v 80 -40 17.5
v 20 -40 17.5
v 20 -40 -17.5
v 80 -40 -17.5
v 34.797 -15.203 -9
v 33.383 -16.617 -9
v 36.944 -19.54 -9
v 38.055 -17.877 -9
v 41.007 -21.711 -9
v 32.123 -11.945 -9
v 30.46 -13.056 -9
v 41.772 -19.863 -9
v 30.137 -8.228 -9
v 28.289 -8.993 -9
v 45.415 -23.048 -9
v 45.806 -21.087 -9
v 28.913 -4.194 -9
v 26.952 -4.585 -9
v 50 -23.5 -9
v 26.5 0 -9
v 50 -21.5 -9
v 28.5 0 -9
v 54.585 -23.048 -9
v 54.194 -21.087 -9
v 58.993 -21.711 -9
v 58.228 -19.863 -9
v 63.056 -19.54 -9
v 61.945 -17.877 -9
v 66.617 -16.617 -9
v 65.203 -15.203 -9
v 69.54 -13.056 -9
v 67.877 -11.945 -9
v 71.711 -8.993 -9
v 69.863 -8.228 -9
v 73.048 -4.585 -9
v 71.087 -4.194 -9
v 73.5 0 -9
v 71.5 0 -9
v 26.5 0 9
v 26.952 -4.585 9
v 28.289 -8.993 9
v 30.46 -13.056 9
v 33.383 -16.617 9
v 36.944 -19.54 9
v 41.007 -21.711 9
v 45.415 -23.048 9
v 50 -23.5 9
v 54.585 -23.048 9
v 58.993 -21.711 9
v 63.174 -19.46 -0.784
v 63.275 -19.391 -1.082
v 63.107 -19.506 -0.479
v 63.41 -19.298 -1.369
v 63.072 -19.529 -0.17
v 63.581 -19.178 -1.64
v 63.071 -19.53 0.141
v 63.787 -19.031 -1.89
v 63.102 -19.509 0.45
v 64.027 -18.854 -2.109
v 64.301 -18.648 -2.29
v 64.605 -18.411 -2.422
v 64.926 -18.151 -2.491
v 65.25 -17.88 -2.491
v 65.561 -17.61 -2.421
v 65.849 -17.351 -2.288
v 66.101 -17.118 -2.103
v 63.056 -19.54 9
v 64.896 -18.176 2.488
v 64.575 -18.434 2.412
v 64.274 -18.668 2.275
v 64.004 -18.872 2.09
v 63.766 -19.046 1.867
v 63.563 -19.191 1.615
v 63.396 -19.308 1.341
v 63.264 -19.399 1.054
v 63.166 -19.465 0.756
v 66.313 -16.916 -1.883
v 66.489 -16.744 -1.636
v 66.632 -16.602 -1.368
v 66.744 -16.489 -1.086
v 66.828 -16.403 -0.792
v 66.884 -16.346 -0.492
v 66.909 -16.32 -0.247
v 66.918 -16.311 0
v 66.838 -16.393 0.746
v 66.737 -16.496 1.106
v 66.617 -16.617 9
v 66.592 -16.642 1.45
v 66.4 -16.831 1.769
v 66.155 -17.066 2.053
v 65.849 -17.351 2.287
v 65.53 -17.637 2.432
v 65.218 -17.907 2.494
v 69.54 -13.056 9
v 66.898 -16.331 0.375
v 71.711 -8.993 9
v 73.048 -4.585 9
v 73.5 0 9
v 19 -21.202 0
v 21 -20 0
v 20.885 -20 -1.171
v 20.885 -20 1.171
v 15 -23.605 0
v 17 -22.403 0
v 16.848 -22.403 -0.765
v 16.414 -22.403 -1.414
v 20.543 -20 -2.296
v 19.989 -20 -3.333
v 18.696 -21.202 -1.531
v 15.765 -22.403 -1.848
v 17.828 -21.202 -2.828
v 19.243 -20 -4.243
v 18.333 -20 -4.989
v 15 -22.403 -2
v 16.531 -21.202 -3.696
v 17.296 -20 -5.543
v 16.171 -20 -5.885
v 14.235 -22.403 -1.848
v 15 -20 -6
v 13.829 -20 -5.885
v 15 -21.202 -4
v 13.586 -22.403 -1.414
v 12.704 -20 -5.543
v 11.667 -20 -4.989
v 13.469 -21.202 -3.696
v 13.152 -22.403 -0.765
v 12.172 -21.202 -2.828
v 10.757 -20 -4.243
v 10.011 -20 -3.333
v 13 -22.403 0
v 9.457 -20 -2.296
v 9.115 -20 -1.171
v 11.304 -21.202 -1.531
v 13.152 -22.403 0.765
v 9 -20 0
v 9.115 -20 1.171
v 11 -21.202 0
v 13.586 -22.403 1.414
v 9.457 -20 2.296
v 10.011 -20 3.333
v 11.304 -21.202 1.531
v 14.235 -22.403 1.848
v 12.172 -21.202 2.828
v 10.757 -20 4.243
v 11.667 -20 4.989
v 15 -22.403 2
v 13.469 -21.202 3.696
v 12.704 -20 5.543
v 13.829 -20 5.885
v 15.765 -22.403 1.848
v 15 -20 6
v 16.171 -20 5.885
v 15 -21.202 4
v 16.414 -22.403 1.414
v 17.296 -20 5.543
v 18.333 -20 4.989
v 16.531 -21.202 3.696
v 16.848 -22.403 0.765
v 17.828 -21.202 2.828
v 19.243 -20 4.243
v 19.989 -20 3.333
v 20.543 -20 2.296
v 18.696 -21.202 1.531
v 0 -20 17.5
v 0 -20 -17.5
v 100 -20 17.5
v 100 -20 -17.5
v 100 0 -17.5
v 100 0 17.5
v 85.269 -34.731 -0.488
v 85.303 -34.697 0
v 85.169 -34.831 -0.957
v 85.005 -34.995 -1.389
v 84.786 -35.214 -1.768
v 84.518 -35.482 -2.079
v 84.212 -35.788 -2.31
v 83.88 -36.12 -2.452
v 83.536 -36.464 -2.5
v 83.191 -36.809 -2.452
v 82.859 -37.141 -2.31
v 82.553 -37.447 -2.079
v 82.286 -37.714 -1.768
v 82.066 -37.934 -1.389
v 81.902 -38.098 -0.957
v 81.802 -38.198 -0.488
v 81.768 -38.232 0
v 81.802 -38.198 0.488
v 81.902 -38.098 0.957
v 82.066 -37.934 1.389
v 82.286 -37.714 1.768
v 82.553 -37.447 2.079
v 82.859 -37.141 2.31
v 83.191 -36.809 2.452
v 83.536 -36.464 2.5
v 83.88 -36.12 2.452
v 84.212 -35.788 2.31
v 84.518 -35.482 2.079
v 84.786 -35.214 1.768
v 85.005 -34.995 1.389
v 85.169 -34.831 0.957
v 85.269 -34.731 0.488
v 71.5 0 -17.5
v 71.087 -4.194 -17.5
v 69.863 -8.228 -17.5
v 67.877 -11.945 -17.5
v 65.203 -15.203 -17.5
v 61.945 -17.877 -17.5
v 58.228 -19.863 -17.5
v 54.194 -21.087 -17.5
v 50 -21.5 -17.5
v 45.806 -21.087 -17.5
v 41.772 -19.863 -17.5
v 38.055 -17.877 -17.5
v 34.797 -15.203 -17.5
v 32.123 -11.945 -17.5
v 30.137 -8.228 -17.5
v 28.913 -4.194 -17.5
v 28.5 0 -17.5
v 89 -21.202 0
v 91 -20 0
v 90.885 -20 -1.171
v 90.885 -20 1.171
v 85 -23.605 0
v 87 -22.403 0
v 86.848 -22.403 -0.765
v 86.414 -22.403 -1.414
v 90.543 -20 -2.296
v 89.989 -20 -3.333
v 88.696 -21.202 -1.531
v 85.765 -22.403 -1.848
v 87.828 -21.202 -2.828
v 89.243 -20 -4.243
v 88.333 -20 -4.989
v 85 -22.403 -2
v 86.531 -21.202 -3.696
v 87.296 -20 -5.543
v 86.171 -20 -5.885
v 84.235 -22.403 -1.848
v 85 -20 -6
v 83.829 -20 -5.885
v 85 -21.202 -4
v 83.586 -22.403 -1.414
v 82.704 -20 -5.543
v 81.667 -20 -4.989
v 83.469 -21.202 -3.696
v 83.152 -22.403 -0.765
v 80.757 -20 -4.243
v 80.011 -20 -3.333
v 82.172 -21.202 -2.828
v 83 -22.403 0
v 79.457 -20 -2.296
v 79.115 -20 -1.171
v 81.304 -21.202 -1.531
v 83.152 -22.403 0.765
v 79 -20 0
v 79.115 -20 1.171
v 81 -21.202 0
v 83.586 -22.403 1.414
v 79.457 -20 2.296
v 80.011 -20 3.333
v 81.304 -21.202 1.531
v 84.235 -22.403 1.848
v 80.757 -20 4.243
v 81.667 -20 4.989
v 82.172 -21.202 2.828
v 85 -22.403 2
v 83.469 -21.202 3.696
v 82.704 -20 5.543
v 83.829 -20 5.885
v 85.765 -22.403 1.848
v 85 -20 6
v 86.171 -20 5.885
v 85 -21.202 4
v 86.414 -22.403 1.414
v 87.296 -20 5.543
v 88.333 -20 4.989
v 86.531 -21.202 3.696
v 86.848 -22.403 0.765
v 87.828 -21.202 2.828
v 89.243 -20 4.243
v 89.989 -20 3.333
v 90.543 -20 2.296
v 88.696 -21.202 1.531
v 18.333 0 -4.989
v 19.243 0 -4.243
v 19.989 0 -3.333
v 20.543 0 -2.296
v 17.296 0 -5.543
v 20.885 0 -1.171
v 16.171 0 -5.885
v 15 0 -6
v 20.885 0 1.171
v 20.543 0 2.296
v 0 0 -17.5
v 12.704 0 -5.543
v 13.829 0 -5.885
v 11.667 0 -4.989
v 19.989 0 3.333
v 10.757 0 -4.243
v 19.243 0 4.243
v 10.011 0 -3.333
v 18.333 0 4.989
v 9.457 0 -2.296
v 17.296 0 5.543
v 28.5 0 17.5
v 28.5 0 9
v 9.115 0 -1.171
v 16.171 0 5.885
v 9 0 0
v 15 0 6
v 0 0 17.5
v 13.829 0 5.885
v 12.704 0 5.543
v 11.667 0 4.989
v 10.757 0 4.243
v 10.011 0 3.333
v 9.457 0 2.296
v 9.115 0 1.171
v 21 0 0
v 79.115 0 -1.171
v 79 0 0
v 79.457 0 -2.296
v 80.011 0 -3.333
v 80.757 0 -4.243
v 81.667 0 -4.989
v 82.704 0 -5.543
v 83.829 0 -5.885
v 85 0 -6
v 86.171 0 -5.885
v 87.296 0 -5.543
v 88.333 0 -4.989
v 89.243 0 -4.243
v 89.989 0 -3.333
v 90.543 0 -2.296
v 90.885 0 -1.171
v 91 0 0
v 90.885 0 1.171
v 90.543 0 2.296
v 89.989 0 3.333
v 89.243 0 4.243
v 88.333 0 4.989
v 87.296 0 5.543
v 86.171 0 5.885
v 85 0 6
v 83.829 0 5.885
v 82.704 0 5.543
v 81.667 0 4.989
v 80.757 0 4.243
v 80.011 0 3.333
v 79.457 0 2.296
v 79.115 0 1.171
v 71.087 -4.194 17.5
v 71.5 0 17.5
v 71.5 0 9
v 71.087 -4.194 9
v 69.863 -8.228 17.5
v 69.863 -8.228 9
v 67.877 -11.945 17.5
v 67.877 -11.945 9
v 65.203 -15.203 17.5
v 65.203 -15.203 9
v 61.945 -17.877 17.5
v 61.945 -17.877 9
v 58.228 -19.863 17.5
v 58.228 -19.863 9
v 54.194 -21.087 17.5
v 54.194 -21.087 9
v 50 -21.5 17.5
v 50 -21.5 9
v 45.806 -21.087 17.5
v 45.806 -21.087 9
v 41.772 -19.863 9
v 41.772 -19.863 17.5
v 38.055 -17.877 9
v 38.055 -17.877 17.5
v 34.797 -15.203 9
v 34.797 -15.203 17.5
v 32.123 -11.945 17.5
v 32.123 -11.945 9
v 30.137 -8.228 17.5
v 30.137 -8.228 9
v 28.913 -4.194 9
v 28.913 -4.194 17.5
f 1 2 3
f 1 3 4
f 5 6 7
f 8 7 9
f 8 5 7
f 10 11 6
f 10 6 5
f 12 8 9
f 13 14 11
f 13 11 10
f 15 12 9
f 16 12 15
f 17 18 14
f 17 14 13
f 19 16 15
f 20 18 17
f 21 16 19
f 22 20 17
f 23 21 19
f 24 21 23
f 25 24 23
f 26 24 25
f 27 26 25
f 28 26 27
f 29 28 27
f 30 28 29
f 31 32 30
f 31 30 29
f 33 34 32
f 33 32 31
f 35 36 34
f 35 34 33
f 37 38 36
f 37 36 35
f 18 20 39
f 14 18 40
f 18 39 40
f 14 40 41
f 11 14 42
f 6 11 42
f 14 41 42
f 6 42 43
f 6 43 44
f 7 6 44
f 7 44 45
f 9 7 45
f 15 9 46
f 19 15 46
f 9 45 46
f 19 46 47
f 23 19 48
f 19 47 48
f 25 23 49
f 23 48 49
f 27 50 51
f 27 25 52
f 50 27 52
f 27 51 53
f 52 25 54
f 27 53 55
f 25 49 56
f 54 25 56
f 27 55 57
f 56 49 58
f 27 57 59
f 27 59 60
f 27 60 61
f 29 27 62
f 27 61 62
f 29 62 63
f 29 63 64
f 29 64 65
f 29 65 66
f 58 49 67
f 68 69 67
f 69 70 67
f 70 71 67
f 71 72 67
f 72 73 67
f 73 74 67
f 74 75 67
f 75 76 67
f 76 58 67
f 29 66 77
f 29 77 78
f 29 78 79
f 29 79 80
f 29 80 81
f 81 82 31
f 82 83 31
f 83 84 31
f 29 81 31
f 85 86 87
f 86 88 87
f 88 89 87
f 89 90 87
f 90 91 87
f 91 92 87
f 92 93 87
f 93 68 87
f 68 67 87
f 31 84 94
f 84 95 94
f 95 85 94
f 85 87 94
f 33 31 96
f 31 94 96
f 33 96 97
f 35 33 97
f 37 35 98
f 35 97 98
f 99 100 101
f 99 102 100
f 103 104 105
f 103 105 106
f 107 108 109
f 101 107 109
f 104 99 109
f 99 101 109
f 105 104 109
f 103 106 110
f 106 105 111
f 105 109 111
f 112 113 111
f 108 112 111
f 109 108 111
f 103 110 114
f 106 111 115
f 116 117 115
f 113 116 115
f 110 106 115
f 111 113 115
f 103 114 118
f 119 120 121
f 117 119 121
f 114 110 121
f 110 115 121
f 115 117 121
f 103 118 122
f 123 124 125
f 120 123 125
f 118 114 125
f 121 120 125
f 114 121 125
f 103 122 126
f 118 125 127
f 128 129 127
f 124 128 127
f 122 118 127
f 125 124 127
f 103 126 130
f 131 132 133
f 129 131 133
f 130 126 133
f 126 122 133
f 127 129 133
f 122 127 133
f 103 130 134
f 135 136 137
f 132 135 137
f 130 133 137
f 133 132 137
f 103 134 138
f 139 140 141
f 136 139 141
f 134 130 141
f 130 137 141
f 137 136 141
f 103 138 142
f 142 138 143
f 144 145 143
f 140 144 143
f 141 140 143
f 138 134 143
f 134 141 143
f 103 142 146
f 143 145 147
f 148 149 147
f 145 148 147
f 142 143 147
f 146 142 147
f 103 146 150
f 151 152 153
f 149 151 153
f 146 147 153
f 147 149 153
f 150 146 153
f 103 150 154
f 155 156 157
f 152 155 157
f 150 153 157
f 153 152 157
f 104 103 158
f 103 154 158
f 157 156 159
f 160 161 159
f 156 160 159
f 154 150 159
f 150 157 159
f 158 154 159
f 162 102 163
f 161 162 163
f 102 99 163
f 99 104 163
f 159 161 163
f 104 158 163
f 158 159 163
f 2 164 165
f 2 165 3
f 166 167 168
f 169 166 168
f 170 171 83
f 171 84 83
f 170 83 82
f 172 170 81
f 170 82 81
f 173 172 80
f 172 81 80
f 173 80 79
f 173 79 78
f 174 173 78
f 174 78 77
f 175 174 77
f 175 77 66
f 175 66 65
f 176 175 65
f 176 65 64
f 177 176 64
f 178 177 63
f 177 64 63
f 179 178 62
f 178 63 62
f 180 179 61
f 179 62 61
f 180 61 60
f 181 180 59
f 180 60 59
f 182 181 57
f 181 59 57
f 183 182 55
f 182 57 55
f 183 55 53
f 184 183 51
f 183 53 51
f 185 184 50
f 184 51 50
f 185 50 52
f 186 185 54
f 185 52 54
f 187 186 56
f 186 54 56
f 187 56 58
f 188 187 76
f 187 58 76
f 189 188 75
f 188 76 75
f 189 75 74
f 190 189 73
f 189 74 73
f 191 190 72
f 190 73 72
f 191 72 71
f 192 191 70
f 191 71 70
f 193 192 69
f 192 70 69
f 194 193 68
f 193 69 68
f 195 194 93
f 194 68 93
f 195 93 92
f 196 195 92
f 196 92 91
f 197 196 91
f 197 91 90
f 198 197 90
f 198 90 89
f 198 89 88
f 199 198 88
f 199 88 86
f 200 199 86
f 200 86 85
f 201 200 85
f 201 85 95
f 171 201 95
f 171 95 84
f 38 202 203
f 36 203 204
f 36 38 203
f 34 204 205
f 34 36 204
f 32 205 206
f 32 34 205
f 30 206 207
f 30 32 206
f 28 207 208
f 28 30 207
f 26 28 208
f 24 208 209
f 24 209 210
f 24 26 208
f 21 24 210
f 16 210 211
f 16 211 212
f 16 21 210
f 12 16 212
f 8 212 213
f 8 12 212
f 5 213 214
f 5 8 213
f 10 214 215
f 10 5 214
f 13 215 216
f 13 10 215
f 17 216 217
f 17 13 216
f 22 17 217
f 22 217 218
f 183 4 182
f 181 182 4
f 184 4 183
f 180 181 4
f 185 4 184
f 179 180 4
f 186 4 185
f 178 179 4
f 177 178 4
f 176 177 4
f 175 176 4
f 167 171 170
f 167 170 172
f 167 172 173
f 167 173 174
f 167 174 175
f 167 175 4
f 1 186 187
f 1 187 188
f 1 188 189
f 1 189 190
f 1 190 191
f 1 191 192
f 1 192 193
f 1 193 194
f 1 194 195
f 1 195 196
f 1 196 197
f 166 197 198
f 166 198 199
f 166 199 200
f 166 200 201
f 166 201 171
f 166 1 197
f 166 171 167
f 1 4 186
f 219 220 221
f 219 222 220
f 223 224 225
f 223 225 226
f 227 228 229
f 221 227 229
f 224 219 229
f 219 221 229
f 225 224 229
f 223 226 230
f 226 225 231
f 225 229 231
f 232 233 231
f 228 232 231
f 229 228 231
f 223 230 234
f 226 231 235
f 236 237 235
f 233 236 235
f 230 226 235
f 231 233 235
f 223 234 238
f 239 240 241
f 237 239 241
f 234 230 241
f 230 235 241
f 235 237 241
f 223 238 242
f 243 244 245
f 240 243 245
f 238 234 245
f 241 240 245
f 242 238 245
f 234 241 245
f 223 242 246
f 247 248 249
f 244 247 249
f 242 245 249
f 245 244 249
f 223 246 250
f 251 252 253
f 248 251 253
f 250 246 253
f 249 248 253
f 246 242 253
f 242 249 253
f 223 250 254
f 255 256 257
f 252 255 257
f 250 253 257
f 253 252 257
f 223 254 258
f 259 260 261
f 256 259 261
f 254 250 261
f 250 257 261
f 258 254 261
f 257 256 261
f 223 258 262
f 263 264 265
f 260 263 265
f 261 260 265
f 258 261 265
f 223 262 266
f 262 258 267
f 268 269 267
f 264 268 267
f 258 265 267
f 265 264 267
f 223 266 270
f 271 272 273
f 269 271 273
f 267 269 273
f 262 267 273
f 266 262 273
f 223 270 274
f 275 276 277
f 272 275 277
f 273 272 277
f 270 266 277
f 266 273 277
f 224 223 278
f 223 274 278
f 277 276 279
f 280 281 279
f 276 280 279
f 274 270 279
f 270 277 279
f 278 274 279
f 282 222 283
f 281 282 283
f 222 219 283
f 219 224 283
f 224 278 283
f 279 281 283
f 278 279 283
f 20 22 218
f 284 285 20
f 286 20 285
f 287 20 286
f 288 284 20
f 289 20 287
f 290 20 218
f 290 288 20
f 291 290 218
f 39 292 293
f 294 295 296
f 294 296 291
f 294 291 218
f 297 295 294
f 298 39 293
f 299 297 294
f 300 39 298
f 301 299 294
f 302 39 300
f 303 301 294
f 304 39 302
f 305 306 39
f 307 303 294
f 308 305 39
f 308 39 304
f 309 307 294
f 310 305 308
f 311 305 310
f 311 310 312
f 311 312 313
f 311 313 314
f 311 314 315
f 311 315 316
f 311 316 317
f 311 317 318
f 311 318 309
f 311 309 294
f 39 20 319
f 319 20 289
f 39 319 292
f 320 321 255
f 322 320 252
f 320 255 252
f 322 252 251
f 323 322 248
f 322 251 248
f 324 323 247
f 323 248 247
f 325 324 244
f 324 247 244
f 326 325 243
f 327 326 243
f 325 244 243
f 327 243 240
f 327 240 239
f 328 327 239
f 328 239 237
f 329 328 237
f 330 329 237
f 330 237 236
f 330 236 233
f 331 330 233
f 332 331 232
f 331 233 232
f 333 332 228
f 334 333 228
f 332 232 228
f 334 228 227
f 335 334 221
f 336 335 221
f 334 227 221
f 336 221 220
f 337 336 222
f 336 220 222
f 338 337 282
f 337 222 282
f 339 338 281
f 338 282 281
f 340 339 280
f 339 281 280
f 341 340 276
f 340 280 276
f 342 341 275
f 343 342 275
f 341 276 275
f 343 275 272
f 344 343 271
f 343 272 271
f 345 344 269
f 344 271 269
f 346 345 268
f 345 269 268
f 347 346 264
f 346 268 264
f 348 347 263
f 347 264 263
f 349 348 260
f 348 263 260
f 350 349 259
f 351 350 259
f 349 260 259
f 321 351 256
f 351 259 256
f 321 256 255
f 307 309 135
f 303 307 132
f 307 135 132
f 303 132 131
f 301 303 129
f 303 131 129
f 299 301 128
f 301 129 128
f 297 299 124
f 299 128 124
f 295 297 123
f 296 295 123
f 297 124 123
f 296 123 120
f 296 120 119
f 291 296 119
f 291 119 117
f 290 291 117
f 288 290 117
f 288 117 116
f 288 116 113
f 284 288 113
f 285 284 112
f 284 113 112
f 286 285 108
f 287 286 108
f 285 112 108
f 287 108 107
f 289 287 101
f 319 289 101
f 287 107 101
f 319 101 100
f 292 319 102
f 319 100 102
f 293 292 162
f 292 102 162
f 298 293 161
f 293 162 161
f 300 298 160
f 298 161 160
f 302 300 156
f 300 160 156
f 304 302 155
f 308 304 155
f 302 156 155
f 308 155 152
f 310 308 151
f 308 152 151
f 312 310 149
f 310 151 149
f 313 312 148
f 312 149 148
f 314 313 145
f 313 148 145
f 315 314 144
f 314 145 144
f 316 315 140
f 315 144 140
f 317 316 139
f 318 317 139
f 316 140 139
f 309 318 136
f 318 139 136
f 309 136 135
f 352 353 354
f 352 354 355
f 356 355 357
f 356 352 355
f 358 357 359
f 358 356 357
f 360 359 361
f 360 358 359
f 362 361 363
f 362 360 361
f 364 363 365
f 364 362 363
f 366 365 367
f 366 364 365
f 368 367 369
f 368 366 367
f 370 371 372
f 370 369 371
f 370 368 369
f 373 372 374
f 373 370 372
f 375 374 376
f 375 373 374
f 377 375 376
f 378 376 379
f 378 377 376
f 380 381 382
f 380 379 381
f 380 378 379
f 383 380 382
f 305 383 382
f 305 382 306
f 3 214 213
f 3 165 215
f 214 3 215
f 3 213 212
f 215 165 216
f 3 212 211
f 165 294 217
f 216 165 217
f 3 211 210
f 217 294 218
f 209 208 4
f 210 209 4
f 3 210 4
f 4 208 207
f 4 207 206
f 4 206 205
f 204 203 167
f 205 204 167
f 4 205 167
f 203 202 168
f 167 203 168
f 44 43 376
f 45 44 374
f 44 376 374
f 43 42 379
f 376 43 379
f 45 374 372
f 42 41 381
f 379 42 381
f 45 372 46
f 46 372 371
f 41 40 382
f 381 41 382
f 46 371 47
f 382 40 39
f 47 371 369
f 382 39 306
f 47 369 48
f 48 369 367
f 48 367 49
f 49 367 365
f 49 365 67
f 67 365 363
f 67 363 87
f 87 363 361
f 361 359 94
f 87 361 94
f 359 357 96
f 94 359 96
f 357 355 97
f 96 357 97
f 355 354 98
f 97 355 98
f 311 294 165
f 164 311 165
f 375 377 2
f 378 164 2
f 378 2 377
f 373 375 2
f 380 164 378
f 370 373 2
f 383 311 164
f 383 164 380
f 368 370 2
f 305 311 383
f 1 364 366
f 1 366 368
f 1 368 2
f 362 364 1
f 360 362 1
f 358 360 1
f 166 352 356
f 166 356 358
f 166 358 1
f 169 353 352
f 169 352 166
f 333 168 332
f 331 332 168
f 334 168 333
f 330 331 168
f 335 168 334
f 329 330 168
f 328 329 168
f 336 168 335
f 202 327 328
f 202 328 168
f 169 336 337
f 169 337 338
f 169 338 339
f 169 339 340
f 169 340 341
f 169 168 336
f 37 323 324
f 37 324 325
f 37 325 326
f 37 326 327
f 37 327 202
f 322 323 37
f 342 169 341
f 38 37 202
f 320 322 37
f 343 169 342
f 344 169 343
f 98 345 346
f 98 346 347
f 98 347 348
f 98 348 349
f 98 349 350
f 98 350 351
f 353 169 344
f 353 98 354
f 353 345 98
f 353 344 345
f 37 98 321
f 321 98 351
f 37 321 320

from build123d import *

# Parameters (mm, degrees)
EXTRUDE_1_DEPTH         = 17.5
SKETCH_3_R              = 23.5
CUT_EXTRUDE_1_DEPTH     = 9
HOLE_WIZARD_M14_1_D     = 12
HOLE_WIZARD_M14_1_DEPTH = 20
HOLE_WIZARD_M14_1_TIP   = 3.605163714
HOLE_WIZARD_M6_1_D      = 5
HOLE_WIZARD_M6_1_DEPTH  = 15
HOLE_WIZARD_M6_1_TIP    = 1.502151548
SKETCH_8_R              = 2.5
CUT_EXTRUDE_2_DEPTH     = 77.871280236


with BuildPart() as part:
    # 草图2 → 凸台-拉伸1 (new, symmetric)
    with BuildSketch(Plane.XY):
        with BuildLine():
            Line((0, 0), (0, -20))
            Line((0, -20), (20, -40))
            Line((20, -40), (80, -40))
            Line((80, -40), (100, -20))
            Line((100, -20), (100, 0))
            Line((100, 0), (71.5, 0))
            ThreePointArc((71.5, 0), (50, -21.500002185), (28.5, 0))
            Line((28.5, 0), (0, 0))
        make_face()
    extrude(amount=EXTRUDE_1_DEPTH, both=True)

    # 草图3 → 切除-拉伸1 (cut, symmetric)
    with BuildSketch(Plane.XY):
        with Locations((50, -2.185e-06)):
            Circle(SKETCH_3_R)
    extrude(amount=CUT_EXTRUDE_1_DEPTH, both=True, mode=Mode.SUBTRACT)

    # M14 螺纹孔1
    with Locations(Plane(origin=(0, 0, 0), x_dir=(1, 0, 0), z_dir=(0, 1, 0))):
        with Locations((15, 0), (85, 0)):
            Hole(HOLE_WIZARD_M14_1_D / 2, depth=HOLE_WIZARD_M14_1_DEPTH)
            with Locations((0, 0, -(HOLE_WIZARD_M14_1_DEPTH + HOLE_WIZARD_M14_1_TIP / 2))):  # 118° drill point
                Cone(0, HOLE_WIZARD_M14_1_D / 2, HOLE_WIZARD_M14_1_TIP, mode=Mode.SUBTRACT)

    # M6 螺纹孔1
    with Locations(Plane(origin=(60, -60, 0), x_dir=(-0.7071067811865476, -0.7071067811865476, 0), z_dir=(0.7071067811865476, -0.7071067811865476, 0))):
        with Locations((-33.284271247, 0)):
            Hole(HOLE_WIZARD_M6_1_D / 2, depth=HOLE_WIZARD_M6_1_DEPTH)
            with Locations((0, 0, -(HOLE_WIZARD_M6_1_DEPTH + HOLE_WIZARD_M6_1_TIP / 2))):  # 118° drill point
                Cone(0, HOLE_WIZARD_M6_1_D / 2, HOLE_WIZARD_M6_1_TIP, mode=Mode.SUBTRACT)

    # 草图8 → 切除-拉伸2 (cut, through all)
    with BuildSketch(Plane(origin=(52.928932188, -52.928932188, 0), x_dir=(-0.7071067811865476, -0.7071067811865476, 0), z_dir=(0.7071067811865476, -0.7071067811865476, 0))):
        with Locations(Location((-33.284271247, 0, 0), (0, 0, 180))):
            Circle(SKETCH_8_R)
    extrude(amount=-CUT_EXTRUDE_2_DEPTH, mode=Mode.SUBTRACT)


solid = part.part
